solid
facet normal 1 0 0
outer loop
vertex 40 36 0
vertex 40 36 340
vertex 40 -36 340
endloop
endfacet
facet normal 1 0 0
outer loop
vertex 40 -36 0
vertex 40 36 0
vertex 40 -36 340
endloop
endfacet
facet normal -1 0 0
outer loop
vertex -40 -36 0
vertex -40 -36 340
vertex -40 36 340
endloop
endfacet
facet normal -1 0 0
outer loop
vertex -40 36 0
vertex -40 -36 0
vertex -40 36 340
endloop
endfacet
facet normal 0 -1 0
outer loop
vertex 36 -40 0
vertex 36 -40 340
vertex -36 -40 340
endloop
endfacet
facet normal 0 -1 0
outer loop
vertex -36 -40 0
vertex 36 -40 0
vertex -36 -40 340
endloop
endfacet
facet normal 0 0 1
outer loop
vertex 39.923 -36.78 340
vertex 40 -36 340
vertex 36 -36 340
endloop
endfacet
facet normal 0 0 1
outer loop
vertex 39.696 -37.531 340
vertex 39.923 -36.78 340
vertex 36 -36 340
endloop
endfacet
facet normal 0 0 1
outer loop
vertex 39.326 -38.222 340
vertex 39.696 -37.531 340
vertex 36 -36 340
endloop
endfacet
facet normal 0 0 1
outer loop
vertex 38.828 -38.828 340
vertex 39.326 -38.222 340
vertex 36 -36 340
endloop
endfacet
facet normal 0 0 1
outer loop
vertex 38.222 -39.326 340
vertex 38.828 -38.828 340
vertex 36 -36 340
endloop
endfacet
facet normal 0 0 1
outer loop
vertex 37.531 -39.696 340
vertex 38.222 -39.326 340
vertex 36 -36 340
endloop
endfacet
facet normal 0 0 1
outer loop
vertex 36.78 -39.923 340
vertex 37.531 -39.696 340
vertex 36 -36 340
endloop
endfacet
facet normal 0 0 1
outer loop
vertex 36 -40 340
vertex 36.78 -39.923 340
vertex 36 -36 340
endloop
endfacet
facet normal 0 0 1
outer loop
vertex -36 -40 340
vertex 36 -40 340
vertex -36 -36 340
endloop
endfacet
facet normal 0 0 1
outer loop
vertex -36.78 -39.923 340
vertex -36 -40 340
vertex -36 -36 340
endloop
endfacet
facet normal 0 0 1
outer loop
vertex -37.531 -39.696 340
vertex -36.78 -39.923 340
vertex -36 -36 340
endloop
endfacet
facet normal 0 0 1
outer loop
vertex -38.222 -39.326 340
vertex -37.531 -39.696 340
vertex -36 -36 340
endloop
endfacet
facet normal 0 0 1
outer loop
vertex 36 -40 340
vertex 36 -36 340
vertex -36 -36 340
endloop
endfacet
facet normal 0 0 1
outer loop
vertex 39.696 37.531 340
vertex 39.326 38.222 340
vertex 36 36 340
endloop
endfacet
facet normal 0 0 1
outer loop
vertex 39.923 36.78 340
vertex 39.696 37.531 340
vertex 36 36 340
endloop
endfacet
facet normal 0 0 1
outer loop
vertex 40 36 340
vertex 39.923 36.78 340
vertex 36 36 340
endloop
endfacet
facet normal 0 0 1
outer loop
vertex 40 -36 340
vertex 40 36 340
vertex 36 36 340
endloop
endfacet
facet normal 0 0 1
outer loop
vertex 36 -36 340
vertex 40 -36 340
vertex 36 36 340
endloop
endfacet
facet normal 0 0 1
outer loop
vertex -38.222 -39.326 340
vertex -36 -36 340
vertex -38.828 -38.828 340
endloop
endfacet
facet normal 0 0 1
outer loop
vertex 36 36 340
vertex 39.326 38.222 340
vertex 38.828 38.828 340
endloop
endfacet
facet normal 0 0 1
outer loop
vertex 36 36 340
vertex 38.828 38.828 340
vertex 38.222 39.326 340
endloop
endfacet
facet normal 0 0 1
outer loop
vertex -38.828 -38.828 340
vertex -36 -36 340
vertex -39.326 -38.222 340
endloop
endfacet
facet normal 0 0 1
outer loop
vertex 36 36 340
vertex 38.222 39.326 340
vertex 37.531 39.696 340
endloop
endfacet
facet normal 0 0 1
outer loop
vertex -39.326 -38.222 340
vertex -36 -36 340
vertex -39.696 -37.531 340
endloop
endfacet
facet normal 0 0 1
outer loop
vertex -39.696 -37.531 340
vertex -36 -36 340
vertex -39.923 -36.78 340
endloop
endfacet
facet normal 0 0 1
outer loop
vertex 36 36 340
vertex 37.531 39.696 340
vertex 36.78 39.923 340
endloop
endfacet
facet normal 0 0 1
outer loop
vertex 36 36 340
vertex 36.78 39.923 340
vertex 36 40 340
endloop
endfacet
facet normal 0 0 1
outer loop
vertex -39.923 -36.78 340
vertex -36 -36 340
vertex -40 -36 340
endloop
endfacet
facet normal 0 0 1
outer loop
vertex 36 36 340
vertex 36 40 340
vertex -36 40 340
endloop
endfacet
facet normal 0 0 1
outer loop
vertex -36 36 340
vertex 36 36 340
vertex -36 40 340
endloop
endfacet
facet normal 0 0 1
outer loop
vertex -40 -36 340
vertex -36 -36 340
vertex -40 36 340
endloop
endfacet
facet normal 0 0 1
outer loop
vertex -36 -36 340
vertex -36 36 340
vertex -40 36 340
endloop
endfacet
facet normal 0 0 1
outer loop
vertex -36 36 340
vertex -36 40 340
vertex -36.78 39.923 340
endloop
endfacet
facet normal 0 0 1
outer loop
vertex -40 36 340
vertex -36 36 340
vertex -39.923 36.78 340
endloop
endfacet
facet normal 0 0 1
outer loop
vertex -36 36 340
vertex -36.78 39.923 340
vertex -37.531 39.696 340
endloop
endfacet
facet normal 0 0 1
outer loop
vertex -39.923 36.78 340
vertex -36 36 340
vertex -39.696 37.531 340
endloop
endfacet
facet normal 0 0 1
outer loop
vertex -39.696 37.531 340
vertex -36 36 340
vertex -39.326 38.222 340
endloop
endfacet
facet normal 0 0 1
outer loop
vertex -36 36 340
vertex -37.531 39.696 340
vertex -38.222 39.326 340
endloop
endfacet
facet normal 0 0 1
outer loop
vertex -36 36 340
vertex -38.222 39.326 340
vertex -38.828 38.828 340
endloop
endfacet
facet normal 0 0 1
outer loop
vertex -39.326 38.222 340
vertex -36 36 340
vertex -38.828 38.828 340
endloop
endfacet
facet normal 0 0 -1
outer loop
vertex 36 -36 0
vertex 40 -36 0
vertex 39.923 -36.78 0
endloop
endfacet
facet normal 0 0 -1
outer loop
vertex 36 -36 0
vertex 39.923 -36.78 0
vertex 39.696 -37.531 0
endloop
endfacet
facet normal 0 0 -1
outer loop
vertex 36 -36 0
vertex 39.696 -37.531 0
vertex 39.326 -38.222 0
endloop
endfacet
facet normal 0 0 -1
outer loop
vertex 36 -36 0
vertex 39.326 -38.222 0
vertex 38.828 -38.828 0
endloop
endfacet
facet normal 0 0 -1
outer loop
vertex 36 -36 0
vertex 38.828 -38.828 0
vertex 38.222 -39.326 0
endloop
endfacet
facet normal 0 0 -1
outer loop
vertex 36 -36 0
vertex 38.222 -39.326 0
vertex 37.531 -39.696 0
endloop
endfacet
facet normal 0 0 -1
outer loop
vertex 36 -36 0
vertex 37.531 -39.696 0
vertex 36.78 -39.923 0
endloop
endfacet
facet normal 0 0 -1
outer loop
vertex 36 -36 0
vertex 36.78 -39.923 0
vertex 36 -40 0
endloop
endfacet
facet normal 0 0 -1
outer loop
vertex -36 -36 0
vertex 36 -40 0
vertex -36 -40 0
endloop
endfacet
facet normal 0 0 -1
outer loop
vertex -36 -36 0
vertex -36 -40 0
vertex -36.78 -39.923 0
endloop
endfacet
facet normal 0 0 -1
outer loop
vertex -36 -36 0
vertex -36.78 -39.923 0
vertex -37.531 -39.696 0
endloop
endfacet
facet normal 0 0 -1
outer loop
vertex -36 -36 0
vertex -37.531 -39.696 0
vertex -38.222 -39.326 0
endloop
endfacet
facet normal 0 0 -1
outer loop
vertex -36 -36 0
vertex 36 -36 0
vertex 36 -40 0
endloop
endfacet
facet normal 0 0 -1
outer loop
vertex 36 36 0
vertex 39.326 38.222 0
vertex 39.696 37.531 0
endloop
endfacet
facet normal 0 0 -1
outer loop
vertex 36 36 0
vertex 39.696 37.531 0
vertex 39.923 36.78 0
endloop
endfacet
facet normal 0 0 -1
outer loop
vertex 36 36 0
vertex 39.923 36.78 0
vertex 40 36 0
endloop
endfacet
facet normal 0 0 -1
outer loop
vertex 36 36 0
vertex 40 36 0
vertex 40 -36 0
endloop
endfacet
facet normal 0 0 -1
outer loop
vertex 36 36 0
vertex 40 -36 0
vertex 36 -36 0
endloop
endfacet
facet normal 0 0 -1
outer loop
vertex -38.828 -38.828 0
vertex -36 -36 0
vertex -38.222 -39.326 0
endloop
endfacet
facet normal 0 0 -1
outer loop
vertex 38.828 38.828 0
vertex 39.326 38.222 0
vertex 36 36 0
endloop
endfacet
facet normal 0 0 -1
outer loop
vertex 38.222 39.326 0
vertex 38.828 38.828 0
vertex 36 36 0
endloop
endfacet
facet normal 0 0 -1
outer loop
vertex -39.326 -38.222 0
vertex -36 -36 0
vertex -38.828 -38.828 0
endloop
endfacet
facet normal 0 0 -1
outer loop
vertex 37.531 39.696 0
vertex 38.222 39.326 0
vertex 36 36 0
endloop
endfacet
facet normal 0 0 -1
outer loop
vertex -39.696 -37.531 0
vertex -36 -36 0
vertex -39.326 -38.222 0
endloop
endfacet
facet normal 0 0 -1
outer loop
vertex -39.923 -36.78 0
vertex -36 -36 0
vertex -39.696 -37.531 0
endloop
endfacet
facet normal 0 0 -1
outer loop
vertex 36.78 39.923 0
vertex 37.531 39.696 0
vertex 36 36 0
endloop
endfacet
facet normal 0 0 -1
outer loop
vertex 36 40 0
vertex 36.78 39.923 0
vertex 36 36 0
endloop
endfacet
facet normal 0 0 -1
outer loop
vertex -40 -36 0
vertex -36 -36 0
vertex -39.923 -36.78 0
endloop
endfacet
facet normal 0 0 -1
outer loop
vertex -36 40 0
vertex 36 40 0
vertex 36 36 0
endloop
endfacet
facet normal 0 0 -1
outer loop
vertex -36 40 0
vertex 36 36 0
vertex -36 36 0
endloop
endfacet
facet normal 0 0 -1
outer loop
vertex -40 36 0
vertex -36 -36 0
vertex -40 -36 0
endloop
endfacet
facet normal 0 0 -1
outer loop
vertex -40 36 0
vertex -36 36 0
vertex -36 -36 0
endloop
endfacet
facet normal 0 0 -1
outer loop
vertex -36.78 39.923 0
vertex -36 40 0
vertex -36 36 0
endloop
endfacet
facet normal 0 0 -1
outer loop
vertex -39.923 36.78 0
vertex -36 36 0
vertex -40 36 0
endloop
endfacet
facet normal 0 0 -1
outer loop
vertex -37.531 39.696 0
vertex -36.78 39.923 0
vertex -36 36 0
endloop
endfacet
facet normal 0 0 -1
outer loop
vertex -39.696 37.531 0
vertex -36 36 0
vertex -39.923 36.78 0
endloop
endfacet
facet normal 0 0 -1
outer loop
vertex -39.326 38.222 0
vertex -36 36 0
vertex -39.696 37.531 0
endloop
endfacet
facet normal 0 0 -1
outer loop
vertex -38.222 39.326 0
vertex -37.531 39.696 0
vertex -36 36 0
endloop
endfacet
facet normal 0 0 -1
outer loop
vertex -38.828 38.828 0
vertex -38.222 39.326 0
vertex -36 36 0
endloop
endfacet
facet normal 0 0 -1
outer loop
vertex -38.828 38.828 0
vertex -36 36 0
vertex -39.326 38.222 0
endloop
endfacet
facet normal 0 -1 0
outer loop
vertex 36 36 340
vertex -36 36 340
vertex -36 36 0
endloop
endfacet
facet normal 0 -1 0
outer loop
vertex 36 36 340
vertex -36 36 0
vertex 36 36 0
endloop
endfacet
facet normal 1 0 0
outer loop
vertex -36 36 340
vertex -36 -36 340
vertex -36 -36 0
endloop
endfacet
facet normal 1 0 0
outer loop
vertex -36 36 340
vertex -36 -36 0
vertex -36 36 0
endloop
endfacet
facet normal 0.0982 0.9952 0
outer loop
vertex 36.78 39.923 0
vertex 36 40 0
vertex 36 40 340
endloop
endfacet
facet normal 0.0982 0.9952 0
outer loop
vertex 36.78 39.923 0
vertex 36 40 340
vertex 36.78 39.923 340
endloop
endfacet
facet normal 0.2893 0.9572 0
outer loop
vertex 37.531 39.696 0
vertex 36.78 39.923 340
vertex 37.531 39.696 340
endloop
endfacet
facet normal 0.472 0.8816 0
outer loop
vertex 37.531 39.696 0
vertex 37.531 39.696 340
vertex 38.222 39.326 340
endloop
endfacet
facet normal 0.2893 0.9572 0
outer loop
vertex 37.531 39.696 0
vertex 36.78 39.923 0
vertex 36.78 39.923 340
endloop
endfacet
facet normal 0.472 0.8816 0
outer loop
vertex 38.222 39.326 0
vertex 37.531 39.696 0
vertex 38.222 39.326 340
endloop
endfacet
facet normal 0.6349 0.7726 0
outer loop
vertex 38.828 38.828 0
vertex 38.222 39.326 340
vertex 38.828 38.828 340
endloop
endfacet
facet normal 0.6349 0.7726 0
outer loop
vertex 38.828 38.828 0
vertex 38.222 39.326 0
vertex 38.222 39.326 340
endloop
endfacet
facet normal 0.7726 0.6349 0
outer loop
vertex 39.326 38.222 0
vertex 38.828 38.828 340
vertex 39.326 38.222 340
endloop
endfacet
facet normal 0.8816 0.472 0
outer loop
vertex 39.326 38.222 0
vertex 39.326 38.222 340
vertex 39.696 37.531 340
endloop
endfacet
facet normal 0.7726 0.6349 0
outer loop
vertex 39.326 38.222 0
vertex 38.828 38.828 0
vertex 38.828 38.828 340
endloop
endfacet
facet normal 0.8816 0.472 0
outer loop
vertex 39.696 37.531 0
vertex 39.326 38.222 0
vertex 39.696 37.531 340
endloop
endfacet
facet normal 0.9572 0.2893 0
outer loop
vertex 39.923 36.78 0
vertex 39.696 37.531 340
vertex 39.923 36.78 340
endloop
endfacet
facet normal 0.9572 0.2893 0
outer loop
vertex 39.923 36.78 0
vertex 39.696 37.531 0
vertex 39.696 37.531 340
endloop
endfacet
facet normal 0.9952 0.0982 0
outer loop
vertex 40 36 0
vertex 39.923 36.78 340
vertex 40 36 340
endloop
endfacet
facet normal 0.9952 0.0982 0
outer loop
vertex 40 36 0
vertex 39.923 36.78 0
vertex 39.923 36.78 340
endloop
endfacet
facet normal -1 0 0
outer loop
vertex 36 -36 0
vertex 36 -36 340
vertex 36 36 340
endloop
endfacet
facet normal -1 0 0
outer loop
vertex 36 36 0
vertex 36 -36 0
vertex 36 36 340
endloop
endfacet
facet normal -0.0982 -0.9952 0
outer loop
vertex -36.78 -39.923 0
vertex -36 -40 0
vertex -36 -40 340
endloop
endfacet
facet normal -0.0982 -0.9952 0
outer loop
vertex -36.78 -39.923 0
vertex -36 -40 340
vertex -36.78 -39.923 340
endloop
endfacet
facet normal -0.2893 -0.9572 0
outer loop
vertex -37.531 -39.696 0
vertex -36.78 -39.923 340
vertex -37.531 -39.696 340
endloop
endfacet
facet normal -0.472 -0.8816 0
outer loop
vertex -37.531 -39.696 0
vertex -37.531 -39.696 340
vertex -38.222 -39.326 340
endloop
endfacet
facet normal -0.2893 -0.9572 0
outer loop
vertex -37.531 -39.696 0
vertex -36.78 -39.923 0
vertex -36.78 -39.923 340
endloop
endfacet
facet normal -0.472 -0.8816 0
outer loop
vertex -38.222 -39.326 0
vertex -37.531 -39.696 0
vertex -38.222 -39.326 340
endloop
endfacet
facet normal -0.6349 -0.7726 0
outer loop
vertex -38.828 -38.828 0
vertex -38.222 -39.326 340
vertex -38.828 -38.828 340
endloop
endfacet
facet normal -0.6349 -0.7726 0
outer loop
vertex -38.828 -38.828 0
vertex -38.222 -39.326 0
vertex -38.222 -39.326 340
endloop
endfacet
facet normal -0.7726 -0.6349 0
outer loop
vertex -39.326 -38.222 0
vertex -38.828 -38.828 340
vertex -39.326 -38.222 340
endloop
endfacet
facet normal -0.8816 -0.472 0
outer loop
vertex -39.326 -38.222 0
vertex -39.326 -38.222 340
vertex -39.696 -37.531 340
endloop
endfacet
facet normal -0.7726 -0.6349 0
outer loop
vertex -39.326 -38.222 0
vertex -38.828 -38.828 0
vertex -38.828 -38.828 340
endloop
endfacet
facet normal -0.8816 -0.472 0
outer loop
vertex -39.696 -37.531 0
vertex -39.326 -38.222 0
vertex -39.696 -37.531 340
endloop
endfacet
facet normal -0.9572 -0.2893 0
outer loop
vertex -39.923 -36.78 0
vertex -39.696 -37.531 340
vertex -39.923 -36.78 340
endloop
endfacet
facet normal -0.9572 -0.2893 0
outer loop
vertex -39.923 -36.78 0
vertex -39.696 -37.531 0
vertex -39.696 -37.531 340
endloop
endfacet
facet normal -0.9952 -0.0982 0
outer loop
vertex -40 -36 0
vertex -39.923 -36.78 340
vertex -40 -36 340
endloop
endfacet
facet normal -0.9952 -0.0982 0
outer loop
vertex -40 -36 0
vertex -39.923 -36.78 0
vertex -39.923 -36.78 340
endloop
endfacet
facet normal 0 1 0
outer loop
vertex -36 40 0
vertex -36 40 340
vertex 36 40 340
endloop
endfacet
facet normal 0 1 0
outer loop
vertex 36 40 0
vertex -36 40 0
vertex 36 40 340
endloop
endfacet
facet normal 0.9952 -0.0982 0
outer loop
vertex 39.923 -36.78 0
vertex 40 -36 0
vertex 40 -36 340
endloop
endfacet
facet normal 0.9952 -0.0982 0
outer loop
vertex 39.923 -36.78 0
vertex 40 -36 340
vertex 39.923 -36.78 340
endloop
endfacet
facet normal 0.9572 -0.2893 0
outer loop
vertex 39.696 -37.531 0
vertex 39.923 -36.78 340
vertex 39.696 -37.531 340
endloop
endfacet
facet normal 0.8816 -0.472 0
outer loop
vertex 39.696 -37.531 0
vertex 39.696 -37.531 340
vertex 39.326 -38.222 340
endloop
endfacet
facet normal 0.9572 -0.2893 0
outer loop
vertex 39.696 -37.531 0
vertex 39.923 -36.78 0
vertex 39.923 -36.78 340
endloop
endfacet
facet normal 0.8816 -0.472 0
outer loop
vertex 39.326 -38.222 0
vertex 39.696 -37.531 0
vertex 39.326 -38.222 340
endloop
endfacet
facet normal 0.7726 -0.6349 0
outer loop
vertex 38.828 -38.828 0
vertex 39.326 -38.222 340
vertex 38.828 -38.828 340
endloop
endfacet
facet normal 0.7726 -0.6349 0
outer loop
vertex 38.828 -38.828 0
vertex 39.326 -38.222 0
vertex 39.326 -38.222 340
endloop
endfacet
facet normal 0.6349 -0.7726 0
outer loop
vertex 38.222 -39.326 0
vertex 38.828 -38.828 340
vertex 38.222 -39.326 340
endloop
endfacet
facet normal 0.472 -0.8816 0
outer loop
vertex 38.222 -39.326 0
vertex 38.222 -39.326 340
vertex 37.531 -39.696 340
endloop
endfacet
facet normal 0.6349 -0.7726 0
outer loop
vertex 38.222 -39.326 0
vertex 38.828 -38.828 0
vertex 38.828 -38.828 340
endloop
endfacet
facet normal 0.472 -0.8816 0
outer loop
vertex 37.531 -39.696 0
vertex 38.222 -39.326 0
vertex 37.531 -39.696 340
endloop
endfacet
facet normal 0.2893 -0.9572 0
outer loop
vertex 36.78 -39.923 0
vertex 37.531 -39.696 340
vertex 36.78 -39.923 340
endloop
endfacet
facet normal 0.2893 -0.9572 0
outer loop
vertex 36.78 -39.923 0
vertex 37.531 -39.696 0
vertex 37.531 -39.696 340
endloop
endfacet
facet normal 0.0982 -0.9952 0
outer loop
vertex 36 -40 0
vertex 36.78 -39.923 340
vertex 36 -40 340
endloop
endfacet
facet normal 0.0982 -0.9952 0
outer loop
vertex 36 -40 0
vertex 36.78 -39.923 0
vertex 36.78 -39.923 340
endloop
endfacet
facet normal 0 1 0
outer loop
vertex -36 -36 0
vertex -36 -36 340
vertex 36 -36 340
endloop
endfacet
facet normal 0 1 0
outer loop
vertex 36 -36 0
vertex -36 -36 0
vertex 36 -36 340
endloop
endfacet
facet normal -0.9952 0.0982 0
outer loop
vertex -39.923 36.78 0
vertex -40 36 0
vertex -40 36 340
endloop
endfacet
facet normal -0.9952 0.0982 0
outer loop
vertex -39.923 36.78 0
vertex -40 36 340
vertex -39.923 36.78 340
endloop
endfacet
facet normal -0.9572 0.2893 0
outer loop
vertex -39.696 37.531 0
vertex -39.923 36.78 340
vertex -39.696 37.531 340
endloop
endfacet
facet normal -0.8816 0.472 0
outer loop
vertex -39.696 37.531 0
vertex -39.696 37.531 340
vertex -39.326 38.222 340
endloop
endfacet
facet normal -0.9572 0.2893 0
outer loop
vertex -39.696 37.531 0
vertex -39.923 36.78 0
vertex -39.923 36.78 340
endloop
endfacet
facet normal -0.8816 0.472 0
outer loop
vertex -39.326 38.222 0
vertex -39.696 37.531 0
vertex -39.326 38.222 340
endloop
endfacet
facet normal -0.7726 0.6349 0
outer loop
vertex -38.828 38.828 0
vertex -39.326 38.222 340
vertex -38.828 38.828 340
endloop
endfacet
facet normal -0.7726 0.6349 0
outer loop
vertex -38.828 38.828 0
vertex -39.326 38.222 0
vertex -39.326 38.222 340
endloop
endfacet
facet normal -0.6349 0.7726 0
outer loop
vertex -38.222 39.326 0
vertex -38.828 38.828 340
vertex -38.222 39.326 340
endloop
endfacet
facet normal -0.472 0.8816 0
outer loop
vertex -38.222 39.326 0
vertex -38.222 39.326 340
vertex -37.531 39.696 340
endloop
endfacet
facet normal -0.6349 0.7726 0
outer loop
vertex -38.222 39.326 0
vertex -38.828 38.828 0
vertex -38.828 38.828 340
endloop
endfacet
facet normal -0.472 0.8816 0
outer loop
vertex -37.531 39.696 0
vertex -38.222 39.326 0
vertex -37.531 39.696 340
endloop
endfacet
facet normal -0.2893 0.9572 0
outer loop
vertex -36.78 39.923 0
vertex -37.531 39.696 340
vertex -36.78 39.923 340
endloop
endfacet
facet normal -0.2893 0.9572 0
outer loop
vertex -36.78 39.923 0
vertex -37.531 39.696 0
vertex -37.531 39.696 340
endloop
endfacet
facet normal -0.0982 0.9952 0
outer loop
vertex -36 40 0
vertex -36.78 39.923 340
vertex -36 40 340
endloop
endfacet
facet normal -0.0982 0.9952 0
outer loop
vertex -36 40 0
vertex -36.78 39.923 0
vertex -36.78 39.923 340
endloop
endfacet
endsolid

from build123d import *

# Parameters (mm, degrees)
IZIM1_W                     = 72
IZIM1_H                     = 72
Y_KSEKLIK_EKSTR_ZYON1_DEPTH = 340


with BuildPart() as part:
    # Çizim1 → Yükseklik-Ekstrüzyon1 (new body)
    with BuildSketch(Plane.XY):
        with BuildLine():
            Line((-36, 40), (36, 40))
            ThreePointArc((36, 40), (38.828427125, 38.828427125), (40, 36))
            Line((40, 36), (40, -36))
            ThreePointArc((40, -36), (38.828427125, -38.828427125), (36, -40))
            Line((36, -40), (-36, -40))
            ThreePointArc((-36, -40), (-38.828427125, -38.828427125), (-40, -36))
            Line((-40, -36), (-40, 36))
            ThreePointArc((-40, 36), (-38.828427125, 38.828427125), (-36, 40))
        make_face()
        Rectangle(IZIM1_W, IZIM1_H, mode=Mode.SUBTRACT)
    extrude(amount=Y_KSEKLIK_EKSTR_ZYON1_DEPTH)


solid = part.part
